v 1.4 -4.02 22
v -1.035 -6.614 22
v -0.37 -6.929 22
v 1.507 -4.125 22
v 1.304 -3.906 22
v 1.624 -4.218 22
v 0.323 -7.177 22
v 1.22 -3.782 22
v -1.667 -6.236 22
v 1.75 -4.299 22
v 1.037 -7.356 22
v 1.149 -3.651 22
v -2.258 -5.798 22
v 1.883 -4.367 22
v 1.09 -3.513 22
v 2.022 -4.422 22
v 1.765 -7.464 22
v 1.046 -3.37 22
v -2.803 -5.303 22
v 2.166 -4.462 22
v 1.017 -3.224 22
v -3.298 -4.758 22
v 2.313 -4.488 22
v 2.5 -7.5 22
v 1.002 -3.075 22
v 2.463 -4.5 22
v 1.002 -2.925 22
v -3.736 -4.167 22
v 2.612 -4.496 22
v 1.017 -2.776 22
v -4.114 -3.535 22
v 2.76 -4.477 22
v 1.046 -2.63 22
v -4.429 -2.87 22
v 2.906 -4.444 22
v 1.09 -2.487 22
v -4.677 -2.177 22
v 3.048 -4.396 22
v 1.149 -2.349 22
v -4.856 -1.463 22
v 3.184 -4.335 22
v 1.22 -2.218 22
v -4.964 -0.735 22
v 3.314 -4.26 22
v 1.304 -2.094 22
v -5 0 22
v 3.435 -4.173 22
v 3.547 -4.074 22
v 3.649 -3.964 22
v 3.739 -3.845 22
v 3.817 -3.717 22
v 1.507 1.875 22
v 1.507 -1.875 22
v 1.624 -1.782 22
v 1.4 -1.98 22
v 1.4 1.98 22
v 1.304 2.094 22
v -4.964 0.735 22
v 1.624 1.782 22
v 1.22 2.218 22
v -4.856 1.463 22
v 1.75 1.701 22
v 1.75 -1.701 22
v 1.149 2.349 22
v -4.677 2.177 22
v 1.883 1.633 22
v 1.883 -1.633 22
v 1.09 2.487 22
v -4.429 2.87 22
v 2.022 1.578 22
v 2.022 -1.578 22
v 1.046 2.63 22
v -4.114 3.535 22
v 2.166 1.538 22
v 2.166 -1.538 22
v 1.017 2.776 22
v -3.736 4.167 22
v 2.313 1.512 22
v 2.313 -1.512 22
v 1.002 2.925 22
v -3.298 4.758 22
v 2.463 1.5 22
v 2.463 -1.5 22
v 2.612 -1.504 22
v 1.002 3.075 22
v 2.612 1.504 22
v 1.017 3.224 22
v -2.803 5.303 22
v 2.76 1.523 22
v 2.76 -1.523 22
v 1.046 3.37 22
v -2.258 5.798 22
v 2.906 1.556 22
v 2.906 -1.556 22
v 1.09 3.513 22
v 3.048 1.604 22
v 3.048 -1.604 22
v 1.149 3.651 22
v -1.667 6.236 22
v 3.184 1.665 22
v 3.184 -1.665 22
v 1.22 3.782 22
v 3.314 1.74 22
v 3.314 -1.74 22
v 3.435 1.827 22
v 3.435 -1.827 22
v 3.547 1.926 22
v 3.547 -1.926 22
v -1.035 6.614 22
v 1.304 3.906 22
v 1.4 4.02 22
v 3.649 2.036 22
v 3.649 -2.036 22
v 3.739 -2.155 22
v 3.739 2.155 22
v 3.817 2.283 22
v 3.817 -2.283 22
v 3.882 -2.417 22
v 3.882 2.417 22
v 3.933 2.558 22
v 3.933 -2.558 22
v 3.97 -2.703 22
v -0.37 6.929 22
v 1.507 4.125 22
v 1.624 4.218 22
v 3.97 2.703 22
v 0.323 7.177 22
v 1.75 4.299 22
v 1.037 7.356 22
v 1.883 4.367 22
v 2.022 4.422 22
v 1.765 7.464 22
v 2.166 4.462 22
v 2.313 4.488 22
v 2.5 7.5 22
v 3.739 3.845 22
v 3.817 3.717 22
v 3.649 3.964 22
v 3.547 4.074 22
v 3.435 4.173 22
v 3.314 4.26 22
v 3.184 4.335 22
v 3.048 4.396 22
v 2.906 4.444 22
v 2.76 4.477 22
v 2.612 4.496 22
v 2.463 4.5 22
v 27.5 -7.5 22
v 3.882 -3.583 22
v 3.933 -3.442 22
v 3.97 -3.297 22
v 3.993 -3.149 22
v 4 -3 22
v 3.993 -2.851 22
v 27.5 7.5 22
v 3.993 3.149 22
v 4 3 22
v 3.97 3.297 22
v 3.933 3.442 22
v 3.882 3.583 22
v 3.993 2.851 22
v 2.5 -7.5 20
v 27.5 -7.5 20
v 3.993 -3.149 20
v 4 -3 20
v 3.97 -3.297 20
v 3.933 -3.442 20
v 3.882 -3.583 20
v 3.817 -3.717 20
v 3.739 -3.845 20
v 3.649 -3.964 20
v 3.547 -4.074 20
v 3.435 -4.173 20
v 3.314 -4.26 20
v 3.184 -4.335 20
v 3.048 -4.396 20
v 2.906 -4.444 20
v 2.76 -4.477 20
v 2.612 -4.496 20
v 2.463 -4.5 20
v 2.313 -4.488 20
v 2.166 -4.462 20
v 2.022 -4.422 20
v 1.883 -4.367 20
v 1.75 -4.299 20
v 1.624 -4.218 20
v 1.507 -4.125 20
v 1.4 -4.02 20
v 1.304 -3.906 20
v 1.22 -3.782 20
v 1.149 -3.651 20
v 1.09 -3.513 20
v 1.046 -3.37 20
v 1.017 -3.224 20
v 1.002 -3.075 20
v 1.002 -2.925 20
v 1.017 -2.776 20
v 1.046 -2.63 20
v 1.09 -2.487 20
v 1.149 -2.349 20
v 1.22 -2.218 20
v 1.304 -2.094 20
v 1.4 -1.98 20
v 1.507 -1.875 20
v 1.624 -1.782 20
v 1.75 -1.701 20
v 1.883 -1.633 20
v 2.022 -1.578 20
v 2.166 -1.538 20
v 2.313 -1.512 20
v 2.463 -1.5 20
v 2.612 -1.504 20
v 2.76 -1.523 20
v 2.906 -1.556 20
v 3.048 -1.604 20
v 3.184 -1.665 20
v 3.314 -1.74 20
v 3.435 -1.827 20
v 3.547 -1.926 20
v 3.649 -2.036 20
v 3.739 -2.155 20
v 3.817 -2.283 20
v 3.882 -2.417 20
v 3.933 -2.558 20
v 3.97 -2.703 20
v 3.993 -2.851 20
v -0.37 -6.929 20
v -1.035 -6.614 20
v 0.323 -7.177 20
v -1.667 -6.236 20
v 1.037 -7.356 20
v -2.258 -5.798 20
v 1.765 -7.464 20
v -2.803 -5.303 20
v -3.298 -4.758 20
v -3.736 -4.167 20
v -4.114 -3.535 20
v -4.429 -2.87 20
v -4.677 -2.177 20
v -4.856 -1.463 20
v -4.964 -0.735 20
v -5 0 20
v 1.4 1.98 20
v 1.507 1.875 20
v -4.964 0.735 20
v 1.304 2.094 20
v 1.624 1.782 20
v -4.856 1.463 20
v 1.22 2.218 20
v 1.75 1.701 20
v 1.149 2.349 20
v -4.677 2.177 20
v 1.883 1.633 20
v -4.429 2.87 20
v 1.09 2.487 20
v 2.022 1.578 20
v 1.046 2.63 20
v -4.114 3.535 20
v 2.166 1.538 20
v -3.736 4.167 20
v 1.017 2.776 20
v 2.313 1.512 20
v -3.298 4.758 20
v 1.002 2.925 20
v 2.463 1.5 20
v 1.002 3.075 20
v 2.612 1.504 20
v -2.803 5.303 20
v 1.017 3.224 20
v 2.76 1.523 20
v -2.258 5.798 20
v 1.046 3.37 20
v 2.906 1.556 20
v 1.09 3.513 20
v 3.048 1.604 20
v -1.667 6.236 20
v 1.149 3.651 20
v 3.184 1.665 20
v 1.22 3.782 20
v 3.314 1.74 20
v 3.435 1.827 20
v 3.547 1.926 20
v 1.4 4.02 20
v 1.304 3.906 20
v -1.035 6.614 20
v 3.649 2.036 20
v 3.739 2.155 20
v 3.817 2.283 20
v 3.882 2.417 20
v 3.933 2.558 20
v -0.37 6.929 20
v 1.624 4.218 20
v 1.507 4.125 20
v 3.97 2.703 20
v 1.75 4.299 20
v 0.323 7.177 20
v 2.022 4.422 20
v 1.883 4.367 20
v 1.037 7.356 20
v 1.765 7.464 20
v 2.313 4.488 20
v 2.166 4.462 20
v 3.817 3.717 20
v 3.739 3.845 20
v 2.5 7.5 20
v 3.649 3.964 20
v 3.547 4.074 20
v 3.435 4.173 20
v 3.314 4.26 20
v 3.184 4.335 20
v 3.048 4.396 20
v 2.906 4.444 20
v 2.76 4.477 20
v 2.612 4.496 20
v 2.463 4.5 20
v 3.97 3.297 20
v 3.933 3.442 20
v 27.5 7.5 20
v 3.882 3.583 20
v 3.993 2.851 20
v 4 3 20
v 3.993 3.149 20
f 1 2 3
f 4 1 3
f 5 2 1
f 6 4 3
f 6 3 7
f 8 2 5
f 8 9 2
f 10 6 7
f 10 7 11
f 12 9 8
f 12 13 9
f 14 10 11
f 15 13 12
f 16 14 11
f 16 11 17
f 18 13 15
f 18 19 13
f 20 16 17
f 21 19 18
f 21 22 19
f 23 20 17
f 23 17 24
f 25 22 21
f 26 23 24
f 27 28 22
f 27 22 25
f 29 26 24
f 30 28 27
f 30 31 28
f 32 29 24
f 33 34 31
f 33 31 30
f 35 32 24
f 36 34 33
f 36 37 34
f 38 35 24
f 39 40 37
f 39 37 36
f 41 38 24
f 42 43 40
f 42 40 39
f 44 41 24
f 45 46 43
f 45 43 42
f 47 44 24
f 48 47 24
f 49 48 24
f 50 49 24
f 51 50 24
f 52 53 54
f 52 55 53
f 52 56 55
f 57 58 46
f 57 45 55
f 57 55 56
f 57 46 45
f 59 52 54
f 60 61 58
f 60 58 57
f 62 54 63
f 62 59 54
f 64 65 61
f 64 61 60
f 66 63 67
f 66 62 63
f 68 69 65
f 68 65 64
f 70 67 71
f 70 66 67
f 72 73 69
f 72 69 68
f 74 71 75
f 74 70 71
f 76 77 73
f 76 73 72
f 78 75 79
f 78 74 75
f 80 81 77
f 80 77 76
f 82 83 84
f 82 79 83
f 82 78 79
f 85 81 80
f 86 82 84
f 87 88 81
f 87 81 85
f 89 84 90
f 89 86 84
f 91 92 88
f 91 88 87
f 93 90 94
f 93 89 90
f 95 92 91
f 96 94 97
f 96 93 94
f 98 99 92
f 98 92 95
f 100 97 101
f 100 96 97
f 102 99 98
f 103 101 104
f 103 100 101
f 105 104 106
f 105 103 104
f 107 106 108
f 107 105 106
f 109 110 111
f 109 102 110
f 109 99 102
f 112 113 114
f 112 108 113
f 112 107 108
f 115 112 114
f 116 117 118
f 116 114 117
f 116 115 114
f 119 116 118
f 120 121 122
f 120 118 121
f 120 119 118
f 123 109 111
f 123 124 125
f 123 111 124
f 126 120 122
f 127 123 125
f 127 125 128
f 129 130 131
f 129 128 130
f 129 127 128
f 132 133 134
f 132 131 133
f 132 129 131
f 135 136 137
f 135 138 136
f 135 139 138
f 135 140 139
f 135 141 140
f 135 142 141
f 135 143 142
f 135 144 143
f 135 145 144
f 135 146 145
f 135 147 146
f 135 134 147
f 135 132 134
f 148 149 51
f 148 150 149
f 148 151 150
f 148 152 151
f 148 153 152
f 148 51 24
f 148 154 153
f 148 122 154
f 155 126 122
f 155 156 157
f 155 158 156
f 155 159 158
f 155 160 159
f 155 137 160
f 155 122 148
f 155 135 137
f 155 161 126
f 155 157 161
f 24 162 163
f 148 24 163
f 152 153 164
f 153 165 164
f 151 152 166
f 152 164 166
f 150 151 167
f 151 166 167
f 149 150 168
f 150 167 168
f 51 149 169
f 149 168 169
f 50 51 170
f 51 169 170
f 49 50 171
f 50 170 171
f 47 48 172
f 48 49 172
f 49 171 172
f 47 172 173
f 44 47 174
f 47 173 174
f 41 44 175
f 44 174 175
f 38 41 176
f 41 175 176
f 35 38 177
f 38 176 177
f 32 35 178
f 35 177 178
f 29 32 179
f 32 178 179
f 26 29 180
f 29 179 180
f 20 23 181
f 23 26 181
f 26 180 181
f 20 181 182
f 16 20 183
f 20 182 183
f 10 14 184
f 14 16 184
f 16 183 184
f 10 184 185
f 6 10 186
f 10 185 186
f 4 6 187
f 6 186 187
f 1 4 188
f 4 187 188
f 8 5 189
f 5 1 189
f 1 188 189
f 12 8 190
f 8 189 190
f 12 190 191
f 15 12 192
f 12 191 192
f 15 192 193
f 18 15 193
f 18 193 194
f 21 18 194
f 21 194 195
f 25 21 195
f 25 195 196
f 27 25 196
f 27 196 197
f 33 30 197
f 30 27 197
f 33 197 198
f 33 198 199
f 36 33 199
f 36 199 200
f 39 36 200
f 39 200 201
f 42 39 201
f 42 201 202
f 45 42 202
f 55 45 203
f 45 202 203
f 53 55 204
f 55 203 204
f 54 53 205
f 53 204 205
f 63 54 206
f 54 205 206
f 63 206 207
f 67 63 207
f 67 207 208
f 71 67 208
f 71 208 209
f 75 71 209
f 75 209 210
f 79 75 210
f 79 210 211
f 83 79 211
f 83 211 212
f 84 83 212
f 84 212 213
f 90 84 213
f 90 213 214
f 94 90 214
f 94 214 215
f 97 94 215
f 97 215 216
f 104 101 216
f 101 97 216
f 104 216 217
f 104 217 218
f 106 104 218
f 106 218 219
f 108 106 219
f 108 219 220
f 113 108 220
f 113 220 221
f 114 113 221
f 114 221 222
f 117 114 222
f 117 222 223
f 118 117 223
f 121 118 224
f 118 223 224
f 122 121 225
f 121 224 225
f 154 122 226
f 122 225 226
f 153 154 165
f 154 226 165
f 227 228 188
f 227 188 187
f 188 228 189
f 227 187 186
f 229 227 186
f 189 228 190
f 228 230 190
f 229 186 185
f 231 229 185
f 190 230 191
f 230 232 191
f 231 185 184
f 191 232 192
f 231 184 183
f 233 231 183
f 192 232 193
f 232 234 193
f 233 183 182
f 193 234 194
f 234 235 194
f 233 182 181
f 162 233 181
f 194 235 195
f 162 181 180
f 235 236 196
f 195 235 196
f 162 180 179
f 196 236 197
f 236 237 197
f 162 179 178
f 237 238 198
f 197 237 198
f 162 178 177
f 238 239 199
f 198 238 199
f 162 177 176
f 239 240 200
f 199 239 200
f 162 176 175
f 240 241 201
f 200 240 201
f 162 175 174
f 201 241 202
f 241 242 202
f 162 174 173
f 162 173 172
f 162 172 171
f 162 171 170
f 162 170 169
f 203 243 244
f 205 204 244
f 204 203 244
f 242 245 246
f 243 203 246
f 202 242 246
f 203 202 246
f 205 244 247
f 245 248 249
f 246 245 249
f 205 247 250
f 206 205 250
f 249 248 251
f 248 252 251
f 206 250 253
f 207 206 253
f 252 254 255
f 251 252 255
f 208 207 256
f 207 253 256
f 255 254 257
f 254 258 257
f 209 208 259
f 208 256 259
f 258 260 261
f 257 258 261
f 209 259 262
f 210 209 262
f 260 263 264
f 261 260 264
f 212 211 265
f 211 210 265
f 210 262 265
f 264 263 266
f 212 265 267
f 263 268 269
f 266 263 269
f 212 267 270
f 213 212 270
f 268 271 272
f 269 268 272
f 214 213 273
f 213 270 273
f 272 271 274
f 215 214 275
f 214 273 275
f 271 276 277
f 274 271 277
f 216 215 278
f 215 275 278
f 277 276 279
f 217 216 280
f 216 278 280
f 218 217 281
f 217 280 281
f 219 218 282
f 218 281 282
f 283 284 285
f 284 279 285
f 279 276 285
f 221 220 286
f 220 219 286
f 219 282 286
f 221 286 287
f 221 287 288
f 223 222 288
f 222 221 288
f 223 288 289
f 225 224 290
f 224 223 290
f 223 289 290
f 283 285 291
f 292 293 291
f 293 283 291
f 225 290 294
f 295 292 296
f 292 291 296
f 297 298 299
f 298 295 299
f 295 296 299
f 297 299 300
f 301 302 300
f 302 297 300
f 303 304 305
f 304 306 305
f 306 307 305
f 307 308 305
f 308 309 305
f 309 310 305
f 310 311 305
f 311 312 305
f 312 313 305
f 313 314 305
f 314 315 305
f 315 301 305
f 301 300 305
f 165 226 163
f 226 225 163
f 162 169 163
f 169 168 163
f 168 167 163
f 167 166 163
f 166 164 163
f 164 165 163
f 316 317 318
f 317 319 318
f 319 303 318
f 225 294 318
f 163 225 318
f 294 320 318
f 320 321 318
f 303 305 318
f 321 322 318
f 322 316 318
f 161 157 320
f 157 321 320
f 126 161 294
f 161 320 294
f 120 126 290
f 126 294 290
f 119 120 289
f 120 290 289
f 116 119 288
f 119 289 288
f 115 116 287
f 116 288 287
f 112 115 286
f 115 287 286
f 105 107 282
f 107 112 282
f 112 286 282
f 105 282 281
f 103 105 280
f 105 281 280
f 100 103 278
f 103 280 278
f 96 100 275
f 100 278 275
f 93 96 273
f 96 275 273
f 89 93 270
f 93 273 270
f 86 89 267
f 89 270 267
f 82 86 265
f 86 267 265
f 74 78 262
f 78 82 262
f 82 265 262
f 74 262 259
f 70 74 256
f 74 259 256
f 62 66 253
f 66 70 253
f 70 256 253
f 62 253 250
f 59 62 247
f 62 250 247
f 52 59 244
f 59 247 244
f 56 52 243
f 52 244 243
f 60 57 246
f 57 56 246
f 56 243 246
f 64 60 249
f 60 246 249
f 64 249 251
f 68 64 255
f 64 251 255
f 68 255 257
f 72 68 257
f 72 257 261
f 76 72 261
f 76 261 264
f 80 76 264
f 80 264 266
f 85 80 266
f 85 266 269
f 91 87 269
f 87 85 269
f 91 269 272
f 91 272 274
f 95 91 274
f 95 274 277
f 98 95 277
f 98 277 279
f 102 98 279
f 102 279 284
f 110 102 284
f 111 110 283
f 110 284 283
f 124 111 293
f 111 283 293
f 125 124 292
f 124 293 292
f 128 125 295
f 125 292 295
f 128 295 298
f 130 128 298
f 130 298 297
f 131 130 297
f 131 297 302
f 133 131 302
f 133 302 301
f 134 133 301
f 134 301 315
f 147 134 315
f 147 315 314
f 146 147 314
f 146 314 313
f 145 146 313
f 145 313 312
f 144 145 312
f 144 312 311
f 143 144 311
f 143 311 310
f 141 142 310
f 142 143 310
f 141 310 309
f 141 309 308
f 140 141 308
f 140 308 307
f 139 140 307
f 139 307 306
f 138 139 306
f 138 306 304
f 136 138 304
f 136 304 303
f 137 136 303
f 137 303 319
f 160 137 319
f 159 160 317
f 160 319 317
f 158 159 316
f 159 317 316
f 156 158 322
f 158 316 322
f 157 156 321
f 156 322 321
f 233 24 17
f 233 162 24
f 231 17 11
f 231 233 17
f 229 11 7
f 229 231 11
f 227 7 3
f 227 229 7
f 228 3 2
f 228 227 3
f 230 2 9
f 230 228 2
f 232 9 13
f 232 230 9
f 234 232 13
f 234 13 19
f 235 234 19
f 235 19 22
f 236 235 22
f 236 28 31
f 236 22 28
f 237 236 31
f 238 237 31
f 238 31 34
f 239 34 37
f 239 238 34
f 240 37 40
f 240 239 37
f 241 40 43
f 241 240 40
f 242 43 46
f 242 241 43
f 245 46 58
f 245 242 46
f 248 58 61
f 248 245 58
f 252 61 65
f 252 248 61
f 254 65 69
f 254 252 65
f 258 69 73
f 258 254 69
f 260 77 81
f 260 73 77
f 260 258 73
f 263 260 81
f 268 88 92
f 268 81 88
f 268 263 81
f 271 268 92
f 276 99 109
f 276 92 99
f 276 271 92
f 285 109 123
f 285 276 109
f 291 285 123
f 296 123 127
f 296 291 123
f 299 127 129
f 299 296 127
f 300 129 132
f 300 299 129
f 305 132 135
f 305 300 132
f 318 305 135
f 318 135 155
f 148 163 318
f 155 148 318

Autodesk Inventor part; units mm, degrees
ref_plane "YZ Plane" through (0, 0, 0) normal (1, 0, 0) x (0, 1, 0)
ref_plane "XZ Plane" through (0, 0, 0) normal (0, 1, 0) x (-1, 0, 0)
sketch "Sketch1" plane through (0, 0, 0) normal (0, 0, 1) x (1, 0, 0)
  circle A0 centre (0, 0) radius 11.25
  line L0 (0, 0) -> (2.5, 0)
  circle A1 centre (2.5, 0) radius 7.5
  line L1 (8, 6.7455) -> (8, -7.7933)
  point P0 (10, 0)
  point P1 (10, 0)
  point P2 (8, -5.099)
  point P3 (8, 5.099)
  dimension "d2" = 15
  dimension "d0" = 22.5
  dimension "d1" = 2.5
  dimension "d3" = 2
extrude "Extrusion1" [suppressed]
extrude "Extrusion2" [suppressed]
sketch "Sketch2" plane through (2.5, 0, 13.5) normal (0, 0, 1) x (1, 0, 0)
  line L0 (0, 0) -> (0, 3)
  circle A0 centre (0, 3) radius 2.75
  line L1 (-18.25, 0) -> (13.25, 0) construction
  circle A1 centre (0, -3) radius 2.75
  point P0 (-2.5, 0)
  dimension "d8" = 3
  dimension "d23" = 5.5
hole "Hole1" [suppressed]
feature "FaceDraft1" [suppressed]
ref_plane "Work Plane1" through (0, 0, 20) normal (0, 0, 1) x (1, 0, 0)
sketch "Sketch3" plane through (0, 0, 20) normal (0, 0, 1) x (1, 0, 0)
  arc A0 (8, 5.099) -> (8, -5.099) centre (2.5, 0) ccw projected
  circle A1 centre (2.5, 3) radius 1.5 projected
  line L0 (2.5, 7.5) -> (27.5, 7.5)
  line L1 (2.5, -7.5) -> (27.5, -7.5)
  line L2 (27.5, -7.5) -> (27.5, 7.5)
  circle A2 centre (2.5, -3) radius 1.5 projected
  point P0 (0, 0)
  dimension "d18" = 25
  dimension "d19" = 25
extrude "Extrusion3" add sketch "Sketch3" along normal blind 2
properties part number "Leaver"
